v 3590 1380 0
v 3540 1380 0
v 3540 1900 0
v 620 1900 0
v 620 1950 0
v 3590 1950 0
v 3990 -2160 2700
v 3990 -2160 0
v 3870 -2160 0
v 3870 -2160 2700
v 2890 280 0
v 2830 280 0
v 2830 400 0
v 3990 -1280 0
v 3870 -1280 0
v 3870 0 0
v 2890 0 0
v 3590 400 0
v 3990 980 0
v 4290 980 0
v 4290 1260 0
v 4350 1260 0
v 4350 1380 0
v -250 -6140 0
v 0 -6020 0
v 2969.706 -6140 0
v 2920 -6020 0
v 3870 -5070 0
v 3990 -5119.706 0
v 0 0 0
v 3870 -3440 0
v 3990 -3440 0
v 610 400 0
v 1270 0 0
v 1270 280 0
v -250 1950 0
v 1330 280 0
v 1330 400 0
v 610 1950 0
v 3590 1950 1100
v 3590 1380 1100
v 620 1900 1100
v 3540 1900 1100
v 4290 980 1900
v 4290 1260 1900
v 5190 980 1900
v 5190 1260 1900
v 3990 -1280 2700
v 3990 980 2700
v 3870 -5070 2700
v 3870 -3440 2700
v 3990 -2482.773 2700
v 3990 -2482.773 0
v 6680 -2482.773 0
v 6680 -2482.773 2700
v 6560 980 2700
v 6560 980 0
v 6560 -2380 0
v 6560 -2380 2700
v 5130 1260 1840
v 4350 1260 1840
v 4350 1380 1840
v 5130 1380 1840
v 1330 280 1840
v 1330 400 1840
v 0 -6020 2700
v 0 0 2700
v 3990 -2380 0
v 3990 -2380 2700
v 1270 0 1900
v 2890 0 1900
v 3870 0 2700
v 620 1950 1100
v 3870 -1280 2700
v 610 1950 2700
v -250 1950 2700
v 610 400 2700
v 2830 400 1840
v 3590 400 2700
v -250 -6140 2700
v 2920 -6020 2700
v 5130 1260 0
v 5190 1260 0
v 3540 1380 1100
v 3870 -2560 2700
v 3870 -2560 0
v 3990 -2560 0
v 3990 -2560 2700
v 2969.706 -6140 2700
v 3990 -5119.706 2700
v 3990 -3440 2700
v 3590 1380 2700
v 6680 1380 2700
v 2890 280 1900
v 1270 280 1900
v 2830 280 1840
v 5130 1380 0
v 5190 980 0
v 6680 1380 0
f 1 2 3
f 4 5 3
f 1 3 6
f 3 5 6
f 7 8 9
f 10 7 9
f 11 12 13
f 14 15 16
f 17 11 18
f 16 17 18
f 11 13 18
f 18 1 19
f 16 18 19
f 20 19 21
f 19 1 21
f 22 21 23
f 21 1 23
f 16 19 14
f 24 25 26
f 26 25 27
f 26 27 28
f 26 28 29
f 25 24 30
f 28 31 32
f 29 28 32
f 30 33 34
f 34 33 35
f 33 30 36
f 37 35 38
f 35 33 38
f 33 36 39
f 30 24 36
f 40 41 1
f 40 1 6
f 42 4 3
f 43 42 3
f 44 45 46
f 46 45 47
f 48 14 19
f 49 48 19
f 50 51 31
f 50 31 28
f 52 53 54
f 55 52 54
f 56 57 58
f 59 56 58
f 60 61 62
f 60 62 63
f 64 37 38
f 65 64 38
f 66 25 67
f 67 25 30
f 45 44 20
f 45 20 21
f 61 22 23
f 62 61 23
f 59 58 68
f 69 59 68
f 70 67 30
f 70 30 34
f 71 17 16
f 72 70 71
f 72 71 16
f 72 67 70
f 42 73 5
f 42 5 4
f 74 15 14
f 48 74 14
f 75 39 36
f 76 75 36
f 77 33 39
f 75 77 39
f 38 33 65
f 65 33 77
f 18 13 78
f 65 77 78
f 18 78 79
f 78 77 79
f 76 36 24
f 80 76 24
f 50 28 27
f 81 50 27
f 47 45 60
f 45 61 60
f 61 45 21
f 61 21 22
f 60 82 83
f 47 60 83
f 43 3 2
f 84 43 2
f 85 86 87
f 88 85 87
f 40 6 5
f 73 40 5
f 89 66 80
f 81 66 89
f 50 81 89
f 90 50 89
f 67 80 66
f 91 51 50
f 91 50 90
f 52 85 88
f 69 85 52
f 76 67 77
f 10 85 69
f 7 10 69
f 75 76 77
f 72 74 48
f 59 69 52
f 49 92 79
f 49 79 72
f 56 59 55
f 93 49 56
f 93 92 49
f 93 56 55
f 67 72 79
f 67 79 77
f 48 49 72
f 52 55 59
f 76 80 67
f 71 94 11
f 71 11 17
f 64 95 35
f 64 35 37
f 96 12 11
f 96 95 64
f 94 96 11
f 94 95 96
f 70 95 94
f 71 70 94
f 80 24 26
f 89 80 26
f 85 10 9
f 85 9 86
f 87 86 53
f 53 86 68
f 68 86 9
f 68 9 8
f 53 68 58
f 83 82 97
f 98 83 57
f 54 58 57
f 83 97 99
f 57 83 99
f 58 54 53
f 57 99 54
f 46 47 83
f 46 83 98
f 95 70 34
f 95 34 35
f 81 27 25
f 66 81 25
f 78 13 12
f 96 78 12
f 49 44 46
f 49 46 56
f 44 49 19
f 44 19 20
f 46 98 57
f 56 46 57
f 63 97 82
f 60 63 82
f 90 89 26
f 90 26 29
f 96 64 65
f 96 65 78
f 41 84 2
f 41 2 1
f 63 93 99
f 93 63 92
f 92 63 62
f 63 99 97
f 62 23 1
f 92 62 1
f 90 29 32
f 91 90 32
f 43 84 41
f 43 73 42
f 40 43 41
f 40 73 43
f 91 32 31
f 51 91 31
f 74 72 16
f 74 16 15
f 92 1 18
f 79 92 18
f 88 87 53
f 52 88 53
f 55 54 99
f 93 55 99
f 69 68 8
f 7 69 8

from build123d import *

# Parameters (mm, degrees)
F2_DEPTH = 2700
F3_DEPTH = 1100
F5_DEPTH = 800
F6_W     = 1500
F6_H     = 120
F6_W_2   = 780
F7_DEPTH = 60


with BuildPart() as f2:
    # F1 (on Top) → F2 (new body)
    with BuildSketch(Plane.XY):
        Polygon((0, -6020), (0, 0), (1270, 0), (1270, 280), (1330, 280), (1330, 400), (610, 400), (610, 1950), (-250, 1950), (-250, -6140), (2969.705627, -6140), (3990, -5119.705627), (3990, -3440), (3870, -3440), (3870, -5070), (2920, -6020), align=None)
        Polygon((2890, 280), (2890, 0), (3870, 0), (3870, -1280), (3990, -1280), (3990, 980), (4290, 980), (4290, 1260), (4350, 1260), (4350, 1380), (3590, 1380), (3590, 400), (2830, 400), (2830, 280), align=None)
        Polygon((6560, -2380), (3990, -2380), (3990, -2160), (3870, -2160), (3870, -2560), (3990, -2560), (3990, -2482.772608), (6680, -2482.772608), (6680, 1380), (5130, 1380), (5130, 1260), (5190, 1260), (5190, 980), (6560, 980), align=None)
    extrude(amount=F2_DEPTH)

    # F4 (on face) → F5 (join)
    with BuildSketch(Plane.XY.offset(2700)):
        Polygon((1330, 400), (1330, 280), (1270, 280), (1270, 0), (2890, 0), (2890, 280), (2830, 280), (2830, 400), align=None)
        Polygon((4350, 1380), (4350, 1260), (4290, 1260), (4290, 980), (5190, 980), (5190, 1260), (5130, 1260), (5130, 1380), align=None)
    extrude(amount=-F5_DEPTH)

    # F6 (on face) → F7 (join)
    with BuildSketch(Plane(origin=(0, 0, 1900), x_dir=(1, 0, 0), z_dir=(0, 0, -1))):
        with Locations((2080, -340)):
            Rectangle(F6_W, F6_H)
        with Locations((4740, -1320)):
            Rectangle(F6_W_2, F6_H)
    extrude(amount=F7_DEPTH)


with BuildPart() as f3:
    # F1 (on Top) → F3 (new body)
    with BuildSketch(Plane.XY):
        Polygon((3540, 1380), (3590, 1380), (3590, 1950), (620, 1950), (620, 1900), (3540, 1900), align=None)
    extrude(amount=F3_DEPTH)


solid = Compound([f2.part, f3.part])
